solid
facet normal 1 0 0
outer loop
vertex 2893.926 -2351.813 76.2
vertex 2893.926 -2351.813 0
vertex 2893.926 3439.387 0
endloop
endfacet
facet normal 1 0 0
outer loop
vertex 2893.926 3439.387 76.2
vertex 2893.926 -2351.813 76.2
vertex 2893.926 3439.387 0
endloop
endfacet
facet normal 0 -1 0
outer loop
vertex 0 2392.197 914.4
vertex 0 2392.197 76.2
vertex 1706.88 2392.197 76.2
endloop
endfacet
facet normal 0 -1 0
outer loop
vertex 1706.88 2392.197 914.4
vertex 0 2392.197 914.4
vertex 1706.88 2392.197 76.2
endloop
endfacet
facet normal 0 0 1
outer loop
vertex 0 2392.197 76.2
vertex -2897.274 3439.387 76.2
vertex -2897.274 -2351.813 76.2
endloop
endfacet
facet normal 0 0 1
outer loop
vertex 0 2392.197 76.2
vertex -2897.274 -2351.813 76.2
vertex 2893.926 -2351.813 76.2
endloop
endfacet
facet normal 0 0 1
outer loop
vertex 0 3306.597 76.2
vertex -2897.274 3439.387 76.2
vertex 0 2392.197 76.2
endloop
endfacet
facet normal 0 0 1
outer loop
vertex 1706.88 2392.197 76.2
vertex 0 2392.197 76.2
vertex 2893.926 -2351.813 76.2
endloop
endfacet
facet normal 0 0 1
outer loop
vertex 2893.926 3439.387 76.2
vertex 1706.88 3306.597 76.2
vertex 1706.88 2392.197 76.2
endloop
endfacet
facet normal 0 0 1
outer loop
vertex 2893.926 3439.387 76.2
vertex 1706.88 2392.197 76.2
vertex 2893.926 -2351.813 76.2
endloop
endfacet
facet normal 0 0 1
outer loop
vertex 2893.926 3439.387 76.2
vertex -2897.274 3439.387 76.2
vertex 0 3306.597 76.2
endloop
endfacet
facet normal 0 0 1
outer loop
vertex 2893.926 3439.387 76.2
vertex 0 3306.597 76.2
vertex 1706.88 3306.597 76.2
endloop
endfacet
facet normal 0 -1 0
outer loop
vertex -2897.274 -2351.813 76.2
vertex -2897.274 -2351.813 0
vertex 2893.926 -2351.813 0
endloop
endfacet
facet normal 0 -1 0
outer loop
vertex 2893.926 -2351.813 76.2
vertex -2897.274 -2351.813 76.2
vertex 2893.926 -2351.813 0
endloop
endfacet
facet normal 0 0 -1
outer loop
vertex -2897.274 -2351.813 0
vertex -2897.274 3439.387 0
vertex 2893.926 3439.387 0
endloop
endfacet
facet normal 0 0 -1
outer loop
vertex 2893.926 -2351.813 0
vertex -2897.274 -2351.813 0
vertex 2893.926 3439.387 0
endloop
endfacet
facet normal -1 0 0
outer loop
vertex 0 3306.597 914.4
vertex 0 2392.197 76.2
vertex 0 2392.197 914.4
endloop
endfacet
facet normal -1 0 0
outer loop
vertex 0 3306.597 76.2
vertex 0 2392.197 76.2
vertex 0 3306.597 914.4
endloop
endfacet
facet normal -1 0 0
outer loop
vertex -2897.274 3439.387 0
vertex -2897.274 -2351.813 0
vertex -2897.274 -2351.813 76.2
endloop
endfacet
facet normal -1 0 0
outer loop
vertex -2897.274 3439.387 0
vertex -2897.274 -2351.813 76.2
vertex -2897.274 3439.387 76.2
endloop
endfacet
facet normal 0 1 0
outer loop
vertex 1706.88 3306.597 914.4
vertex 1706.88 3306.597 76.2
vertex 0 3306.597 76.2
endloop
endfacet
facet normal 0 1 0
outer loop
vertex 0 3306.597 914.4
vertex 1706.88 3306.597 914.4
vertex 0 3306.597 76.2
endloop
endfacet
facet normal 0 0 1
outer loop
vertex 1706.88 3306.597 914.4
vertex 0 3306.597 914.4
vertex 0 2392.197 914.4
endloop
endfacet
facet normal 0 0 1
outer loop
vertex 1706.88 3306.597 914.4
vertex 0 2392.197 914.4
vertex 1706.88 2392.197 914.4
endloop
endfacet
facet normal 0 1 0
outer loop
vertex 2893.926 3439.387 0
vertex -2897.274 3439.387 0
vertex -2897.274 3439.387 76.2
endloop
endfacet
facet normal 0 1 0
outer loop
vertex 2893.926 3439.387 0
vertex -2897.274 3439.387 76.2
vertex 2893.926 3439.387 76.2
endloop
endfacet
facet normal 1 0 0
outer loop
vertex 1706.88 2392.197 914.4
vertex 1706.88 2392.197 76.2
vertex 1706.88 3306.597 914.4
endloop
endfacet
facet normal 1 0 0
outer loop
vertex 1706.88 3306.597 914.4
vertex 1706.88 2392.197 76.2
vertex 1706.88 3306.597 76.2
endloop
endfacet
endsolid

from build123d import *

# Parameters (mm, degrees)
F0_W     = 5791.2
F0_H     = 5791.2
F1_DEPTH = 2438.4
F2_T     = -76.2
F3_W     = 853.44
F3_H     = 914.4
F4_DEPTH = 914.4


with BuildPart() as f1:
    # F0 (on Top) → F1 (new body)
    with BuildSketch(Plane.XY):
        with Locations((-1.673922, 543.786808)):
            Rectangle(F0_W, F0_H)
    extrude(amount=F1_DEPTH)

    # F2
    f2_openings = [f1.faces().sort_by_distance(p)[0] for p in [
        (-1.673922, 543.786808, 2438.4),
        (2893.926078, 543.786808, 1219.2),
        (-1.673922, -2351.813192, 1219.2),
        (-1.673922, 3439.386808, 1219.2),
        (-2897.273922, 543.786808, 1219.2),
    ]]
    offset(amount=F2_T, openings=f2_openings)

    # F3 (on Top) → F4 (join)
    with BuildSketch(Plane.XY):
        with Locations((426.72, 2849.396897)):
            Rectangle(F3_W, F3_H)
        with Locations((1280.16, 2849.396897)):
            Rectangle(F3_W, F3_H)
    extrude(amount=F4_DEPTH)


solid = f1.part
